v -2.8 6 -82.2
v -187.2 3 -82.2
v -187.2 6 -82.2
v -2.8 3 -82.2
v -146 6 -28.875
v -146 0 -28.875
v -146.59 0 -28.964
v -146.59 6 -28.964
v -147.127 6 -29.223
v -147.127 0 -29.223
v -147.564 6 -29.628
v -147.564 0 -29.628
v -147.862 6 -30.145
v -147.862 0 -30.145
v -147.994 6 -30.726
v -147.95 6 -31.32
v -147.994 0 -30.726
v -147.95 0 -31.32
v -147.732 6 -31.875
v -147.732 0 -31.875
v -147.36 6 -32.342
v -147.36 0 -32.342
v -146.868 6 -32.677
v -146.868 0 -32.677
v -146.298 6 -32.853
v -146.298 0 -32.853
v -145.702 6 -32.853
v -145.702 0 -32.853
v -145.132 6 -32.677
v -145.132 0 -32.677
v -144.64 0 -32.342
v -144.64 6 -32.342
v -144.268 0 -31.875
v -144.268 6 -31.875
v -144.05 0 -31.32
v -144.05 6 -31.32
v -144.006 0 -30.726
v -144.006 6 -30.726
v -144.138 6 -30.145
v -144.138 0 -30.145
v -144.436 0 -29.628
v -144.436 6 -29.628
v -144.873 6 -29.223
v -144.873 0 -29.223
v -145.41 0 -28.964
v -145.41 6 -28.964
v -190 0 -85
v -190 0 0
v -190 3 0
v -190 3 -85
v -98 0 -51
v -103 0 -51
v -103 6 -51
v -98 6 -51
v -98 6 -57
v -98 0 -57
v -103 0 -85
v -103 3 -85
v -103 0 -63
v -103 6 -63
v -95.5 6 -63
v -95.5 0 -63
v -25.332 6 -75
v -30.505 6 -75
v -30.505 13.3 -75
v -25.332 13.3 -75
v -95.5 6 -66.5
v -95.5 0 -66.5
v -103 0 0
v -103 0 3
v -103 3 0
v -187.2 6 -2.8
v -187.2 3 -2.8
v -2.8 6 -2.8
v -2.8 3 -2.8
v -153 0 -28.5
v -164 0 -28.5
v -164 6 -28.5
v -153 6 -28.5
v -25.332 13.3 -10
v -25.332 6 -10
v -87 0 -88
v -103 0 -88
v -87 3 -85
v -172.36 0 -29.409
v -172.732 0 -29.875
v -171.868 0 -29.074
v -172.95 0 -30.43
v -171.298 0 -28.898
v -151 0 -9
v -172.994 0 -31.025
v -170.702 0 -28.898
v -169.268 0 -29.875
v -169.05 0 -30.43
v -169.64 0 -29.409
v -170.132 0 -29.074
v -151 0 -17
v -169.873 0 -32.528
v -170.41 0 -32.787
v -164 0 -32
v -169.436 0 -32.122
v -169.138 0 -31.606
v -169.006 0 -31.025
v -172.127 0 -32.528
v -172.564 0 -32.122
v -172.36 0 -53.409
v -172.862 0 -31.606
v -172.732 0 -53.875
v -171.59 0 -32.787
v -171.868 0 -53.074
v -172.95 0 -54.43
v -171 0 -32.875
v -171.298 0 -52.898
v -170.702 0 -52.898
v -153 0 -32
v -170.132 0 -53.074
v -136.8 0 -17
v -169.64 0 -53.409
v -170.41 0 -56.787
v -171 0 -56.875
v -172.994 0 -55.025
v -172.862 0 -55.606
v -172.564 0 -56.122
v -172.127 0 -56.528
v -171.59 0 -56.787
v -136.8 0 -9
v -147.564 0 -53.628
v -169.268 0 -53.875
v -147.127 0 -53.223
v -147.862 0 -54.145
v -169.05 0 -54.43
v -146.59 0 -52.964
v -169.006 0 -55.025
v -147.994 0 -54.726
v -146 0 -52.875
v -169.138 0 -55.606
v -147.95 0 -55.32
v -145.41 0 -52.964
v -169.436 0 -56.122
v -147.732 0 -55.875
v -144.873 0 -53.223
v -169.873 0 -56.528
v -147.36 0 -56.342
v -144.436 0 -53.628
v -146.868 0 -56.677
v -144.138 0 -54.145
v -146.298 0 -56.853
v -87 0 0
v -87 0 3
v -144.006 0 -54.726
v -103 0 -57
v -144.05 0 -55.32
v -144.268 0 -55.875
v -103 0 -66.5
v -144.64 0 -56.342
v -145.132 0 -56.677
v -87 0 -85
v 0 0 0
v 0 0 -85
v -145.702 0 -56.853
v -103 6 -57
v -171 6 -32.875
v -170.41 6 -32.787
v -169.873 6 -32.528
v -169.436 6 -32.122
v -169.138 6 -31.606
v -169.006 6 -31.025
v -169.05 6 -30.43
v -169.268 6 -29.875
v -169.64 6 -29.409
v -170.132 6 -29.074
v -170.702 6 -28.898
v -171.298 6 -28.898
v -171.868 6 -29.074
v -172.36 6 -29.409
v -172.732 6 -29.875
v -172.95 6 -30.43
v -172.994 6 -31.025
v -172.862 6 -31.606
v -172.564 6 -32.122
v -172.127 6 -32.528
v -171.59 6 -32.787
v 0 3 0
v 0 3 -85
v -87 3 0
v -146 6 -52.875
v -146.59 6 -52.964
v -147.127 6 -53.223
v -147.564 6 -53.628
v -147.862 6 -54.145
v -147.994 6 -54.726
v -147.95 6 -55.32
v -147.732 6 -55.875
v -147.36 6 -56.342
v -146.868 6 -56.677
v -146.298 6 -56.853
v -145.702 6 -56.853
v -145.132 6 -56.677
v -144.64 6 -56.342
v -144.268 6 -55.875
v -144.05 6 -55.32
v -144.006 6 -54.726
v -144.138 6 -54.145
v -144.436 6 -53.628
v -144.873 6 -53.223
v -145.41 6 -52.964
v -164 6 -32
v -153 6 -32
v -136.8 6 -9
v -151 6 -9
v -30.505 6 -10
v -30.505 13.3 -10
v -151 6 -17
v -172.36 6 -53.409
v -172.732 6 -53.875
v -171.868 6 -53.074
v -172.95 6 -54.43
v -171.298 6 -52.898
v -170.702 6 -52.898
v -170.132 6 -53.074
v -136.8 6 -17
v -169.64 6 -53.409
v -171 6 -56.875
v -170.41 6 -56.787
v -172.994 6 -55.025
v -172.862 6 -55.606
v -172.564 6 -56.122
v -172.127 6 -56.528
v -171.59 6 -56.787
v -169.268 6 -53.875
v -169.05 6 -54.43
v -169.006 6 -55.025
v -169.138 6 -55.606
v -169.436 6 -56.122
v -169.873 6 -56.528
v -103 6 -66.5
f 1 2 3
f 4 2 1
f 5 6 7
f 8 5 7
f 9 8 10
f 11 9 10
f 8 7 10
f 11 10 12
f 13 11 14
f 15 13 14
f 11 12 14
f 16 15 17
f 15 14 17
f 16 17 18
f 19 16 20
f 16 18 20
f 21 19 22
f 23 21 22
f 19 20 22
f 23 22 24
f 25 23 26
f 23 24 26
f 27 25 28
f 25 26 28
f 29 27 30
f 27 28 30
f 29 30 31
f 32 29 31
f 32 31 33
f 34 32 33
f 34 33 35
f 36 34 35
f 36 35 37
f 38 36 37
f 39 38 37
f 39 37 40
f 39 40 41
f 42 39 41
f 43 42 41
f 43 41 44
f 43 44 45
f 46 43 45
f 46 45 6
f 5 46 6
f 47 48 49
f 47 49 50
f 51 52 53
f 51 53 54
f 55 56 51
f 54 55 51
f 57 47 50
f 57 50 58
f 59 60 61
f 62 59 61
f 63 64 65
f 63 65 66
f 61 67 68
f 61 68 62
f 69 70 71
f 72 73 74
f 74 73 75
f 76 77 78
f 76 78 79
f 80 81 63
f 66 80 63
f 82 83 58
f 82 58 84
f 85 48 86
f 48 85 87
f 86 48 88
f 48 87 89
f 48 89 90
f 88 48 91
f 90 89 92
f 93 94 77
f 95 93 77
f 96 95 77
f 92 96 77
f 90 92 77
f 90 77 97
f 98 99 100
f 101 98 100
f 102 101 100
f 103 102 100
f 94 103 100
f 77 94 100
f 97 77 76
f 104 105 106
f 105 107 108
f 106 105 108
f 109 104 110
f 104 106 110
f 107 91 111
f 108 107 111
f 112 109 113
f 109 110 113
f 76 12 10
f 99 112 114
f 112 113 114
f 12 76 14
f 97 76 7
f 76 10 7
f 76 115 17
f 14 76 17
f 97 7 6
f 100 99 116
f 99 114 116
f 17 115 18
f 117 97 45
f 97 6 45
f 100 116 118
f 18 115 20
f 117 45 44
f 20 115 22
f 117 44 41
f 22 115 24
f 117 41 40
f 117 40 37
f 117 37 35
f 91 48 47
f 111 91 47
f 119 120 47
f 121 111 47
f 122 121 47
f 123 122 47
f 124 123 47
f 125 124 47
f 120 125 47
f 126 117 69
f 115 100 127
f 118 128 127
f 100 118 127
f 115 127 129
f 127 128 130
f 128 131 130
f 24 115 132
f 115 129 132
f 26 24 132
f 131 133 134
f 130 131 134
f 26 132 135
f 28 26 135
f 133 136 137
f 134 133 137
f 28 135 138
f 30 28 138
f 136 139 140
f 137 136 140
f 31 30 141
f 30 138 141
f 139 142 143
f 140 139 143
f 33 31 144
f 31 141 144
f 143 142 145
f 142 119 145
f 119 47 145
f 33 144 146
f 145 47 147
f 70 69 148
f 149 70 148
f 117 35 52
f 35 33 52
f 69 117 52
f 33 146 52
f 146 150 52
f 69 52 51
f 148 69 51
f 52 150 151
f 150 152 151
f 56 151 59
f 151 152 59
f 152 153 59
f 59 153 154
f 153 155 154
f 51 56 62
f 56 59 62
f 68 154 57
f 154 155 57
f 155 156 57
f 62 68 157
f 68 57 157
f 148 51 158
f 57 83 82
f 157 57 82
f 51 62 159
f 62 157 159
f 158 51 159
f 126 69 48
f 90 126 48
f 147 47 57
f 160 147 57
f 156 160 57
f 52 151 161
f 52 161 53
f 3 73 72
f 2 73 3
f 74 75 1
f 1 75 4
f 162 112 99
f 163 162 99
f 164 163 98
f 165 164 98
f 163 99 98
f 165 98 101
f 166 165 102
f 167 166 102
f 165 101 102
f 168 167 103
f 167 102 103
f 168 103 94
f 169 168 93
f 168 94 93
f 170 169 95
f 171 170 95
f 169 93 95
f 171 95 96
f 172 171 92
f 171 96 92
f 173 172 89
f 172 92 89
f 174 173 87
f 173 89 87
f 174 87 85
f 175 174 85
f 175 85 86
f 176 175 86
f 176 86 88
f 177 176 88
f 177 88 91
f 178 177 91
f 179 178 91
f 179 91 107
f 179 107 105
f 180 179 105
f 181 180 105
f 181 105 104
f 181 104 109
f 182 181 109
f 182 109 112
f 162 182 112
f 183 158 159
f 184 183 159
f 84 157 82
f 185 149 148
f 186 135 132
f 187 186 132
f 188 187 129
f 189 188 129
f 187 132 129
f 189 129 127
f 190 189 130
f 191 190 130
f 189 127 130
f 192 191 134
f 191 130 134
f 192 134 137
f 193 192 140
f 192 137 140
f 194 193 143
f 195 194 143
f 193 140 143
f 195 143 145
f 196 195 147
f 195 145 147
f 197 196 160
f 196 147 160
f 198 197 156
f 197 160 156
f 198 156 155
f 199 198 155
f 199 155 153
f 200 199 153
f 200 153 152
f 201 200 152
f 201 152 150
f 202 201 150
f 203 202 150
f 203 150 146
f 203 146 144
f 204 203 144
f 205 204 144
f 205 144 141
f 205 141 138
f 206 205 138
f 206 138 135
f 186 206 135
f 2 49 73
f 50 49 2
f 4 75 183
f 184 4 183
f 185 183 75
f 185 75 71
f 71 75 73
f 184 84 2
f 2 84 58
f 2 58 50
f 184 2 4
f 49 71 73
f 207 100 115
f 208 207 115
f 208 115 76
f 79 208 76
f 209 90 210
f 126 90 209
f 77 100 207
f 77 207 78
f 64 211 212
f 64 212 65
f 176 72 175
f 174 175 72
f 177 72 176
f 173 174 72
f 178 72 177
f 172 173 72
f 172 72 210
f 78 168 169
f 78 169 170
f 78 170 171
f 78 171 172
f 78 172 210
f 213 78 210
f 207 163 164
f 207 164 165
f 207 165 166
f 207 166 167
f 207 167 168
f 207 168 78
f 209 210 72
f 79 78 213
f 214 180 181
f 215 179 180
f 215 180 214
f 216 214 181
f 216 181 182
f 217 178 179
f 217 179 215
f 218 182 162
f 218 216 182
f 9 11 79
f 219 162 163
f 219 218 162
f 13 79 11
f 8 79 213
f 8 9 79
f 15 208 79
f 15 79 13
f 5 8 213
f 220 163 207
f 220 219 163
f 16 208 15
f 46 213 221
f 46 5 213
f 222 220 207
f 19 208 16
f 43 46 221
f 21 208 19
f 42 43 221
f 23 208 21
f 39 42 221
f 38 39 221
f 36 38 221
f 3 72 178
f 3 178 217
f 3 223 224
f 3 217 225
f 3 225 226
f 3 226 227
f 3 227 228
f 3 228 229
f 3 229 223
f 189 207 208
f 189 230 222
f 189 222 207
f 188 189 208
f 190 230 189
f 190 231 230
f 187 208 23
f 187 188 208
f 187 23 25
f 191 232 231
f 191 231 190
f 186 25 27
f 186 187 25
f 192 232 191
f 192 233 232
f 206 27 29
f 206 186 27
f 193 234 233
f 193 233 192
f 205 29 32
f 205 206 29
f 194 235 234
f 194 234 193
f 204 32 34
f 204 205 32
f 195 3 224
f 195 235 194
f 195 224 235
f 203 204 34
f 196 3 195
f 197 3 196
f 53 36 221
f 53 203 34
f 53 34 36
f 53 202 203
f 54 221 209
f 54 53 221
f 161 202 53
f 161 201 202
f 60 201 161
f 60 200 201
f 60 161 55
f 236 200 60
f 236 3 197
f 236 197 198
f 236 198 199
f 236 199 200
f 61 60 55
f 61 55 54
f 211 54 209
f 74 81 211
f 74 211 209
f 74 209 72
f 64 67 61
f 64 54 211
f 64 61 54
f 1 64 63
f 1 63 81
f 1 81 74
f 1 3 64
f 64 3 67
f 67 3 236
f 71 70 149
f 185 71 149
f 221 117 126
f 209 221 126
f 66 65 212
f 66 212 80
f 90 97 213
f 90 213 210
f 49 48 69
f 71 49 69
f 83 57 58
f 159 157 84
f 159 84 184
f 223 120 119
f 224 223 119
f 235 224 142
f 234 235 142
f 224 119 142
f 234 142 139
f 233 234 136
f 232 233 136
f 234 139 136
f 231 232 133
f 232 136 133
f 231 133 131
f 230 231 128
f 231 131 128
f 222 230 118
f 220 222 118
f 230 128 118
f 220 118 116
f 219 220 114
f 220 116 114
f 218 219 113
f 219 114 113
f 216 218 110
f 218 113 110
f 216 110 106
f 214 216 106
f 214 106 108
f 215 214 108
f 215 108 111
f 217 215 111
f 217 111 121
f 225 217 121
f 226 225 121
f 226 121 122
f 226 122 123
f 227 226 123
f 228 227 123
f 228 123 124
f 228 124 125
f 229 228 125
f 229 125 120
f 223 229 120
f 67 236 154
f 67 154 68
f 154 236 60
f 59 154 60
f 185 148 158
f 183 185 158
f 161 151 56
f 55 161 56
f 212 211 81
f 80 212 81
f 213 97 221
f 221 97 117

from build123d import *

# Parameters (mm, degrees)
SKETCH2_W               = 190
SKETCH2_H               = 85
BOSS_EXTRUDE1_DEPTH     = 3
SKETCH6_W               = 184.4
SKETCH6_H               = 79.4
BOSS_EXTRUDE4_DEPTH     = 3
SKETCH8_W               = 16
SKETCH8_H               = 3
BOSS_EXTRUDE5_DEPTH     = 3
CHAMFER2_SIZE           = 3
CUT_EXTRUDE1_DEPTH      = 210.475535564
CUT_EXTRUDE1_DEPTH_BACK = 210.475535564
SKETCH10_W              = 7.5
SKETCH10_H              = 3.5
SKETCH11_W              = 5
SKETCH11_H              = 6
CUT_EXTRUDE2_DEPTH      = 210.475535564
SKETCH12_R              = 2
SKETCH12_W              = 11
SKETCH12_H              = 3.5
CUT_EXTRUDE3_DEPTH      = 210.475535564
SKETCH13_W              = 14.2
SKETCH13_H              = 8
CUT_EXTRUDE4_DEPTH      = 210.475535564
SKETCH14_W              = 5.173747918
SKETCH14_H              = 65
BOSS_EXTRUDE6_DEPTH     = 7.3


with BuildPart() as part:
    # Sketch2 → Boss-Extrude1 (new body)
    with BuildSketch(Plane(origin=(0, 0, 0), x_dir=(1, 0, 0), z_dir=(0, 1, 0))):
        with Locations((-95, 42.5)):
            Rectangle(SKETCH2_W, SKETCH2_H)
    extrude(amount=BOSS_EXTRUDE1_DEPTH)

    # Sketch6 → Boss-Extrude4 (add)
    with BuildSketch(Plane(origin=(0, 3, 0), x_dir=(1, 0, 0), z_dir=(0, 1, 0))):
        with Locations((-95, 42.5)):
            Rectangle(SKETCH6_W, SKETCH6_H)
    extrude(amount=BOSS_EXTRUDE4_DEPTH)

    # Sketch8 → Boss-Extrude5 (add)
    with BuildSketch(Plane(origin=(0, 3, 0), x_dir=(1, 0, 0), z_dir=(0, 1, 0))):
        with Locations((-95, -1.5)):
            Rectangle(SKETCH8_W, SKETCH8_H)
        with Locations((-95, 86.5)):
            Rectangle(SKETCH8_W, SKETCH8_H)
    extrude(amount=-BOSS_EXTRUDE5_DEPTH)

    # Chamfer2
    chamfer2_edges = [part.edges().sort_by_distance(p)[0] for p in [
        (-95, 3, 3),
        (-95, 3, -88),
    ]]
    chamfer(chamfer2_edges, length=CHAMFER2_SIZE - 0.0001)  # a hair under: the kernel refuses the full size

    # Sketch10 → Cut-Extrude1 (cut, two sides: drawn at the far end of the back side and taken through both)
    with BuildSketch(Plane.XZ.offset(-CUT_EXTRUDE1_DEPTH_BACK)):
        with Locations((-99.25, -64.75)):
            Rectangle(SKETCH10_W, SKETCH10_H)
    extrude(amount=CUT_EXTRUDE1_DEPTH + CUT_EXTRUDE1_DEPTH_BACK, mode=Mode.SUBTRACT)

    # Sketch11 → Cut-Extrude2 (cut, through all)
    with BuildSketch(Plane.XZ):
        with Locations((-100.5, -54)):
            Rectangle(SKETCH11_W, SKETCH11_H)
    extrude(amount=-CUT_EXTRUDE2_DEPTH, mode=Mode.SUBTRACT)

    # Sketch12 → Cut-Extrude3 (cut, through all)
    with BuildSketch(Plane.XZ):
        with Locations(Location((-171, -54.875455527, 0), (0, 0, 270))):
            Circle(SKETCH12_R)
        with Locations(Location((-171, -30.875455527, 0), (0, 0, 270))):
            Circle(SKETCH12_R)
        with Locations(Location((-146, -54.875455527, 0), (0, 0, 90))):
            Circle(SKETCH12_R)
        with Locations(Location((-146, -30.875455527, 0), (0, 0, 90))):
            Circle(SKETCH12_R)
        with Locations((-158.5, -30.25)):
            Rectangle(SKETCH12_W, SKETCH12_H)
    extrude(amount=-CUT_EXTRUDE3_DEPTH, mode=Mode.SUBTRACT)

    # Sketch13 → Cut-Extrude4 (cut, through all)
    with BuildSketch(Plane.XZ):
        with Locations((-143.9, -13)):
            Rectangle(SKETCH13_W, SKETCH13_H)
    extrude(amount=-CUT_EXTRUDE4_DEPTH, mode=Mode.SUBTRACT)

    # Sketch14 → Boss-Extrude6 (add)
    with BuildSketch(Plane(origin=(0, 6, 0), x_dir=(1, 0, 0), z_dir=(0, 1, 0))):
        with Locations((-27.918538548, 42.5)):
            Rectangle(SKETCH14_W, SKETCH14_H)
    extrude(amount=BOSS_EXTRUDE6_DEPTH)


solid = part.part
